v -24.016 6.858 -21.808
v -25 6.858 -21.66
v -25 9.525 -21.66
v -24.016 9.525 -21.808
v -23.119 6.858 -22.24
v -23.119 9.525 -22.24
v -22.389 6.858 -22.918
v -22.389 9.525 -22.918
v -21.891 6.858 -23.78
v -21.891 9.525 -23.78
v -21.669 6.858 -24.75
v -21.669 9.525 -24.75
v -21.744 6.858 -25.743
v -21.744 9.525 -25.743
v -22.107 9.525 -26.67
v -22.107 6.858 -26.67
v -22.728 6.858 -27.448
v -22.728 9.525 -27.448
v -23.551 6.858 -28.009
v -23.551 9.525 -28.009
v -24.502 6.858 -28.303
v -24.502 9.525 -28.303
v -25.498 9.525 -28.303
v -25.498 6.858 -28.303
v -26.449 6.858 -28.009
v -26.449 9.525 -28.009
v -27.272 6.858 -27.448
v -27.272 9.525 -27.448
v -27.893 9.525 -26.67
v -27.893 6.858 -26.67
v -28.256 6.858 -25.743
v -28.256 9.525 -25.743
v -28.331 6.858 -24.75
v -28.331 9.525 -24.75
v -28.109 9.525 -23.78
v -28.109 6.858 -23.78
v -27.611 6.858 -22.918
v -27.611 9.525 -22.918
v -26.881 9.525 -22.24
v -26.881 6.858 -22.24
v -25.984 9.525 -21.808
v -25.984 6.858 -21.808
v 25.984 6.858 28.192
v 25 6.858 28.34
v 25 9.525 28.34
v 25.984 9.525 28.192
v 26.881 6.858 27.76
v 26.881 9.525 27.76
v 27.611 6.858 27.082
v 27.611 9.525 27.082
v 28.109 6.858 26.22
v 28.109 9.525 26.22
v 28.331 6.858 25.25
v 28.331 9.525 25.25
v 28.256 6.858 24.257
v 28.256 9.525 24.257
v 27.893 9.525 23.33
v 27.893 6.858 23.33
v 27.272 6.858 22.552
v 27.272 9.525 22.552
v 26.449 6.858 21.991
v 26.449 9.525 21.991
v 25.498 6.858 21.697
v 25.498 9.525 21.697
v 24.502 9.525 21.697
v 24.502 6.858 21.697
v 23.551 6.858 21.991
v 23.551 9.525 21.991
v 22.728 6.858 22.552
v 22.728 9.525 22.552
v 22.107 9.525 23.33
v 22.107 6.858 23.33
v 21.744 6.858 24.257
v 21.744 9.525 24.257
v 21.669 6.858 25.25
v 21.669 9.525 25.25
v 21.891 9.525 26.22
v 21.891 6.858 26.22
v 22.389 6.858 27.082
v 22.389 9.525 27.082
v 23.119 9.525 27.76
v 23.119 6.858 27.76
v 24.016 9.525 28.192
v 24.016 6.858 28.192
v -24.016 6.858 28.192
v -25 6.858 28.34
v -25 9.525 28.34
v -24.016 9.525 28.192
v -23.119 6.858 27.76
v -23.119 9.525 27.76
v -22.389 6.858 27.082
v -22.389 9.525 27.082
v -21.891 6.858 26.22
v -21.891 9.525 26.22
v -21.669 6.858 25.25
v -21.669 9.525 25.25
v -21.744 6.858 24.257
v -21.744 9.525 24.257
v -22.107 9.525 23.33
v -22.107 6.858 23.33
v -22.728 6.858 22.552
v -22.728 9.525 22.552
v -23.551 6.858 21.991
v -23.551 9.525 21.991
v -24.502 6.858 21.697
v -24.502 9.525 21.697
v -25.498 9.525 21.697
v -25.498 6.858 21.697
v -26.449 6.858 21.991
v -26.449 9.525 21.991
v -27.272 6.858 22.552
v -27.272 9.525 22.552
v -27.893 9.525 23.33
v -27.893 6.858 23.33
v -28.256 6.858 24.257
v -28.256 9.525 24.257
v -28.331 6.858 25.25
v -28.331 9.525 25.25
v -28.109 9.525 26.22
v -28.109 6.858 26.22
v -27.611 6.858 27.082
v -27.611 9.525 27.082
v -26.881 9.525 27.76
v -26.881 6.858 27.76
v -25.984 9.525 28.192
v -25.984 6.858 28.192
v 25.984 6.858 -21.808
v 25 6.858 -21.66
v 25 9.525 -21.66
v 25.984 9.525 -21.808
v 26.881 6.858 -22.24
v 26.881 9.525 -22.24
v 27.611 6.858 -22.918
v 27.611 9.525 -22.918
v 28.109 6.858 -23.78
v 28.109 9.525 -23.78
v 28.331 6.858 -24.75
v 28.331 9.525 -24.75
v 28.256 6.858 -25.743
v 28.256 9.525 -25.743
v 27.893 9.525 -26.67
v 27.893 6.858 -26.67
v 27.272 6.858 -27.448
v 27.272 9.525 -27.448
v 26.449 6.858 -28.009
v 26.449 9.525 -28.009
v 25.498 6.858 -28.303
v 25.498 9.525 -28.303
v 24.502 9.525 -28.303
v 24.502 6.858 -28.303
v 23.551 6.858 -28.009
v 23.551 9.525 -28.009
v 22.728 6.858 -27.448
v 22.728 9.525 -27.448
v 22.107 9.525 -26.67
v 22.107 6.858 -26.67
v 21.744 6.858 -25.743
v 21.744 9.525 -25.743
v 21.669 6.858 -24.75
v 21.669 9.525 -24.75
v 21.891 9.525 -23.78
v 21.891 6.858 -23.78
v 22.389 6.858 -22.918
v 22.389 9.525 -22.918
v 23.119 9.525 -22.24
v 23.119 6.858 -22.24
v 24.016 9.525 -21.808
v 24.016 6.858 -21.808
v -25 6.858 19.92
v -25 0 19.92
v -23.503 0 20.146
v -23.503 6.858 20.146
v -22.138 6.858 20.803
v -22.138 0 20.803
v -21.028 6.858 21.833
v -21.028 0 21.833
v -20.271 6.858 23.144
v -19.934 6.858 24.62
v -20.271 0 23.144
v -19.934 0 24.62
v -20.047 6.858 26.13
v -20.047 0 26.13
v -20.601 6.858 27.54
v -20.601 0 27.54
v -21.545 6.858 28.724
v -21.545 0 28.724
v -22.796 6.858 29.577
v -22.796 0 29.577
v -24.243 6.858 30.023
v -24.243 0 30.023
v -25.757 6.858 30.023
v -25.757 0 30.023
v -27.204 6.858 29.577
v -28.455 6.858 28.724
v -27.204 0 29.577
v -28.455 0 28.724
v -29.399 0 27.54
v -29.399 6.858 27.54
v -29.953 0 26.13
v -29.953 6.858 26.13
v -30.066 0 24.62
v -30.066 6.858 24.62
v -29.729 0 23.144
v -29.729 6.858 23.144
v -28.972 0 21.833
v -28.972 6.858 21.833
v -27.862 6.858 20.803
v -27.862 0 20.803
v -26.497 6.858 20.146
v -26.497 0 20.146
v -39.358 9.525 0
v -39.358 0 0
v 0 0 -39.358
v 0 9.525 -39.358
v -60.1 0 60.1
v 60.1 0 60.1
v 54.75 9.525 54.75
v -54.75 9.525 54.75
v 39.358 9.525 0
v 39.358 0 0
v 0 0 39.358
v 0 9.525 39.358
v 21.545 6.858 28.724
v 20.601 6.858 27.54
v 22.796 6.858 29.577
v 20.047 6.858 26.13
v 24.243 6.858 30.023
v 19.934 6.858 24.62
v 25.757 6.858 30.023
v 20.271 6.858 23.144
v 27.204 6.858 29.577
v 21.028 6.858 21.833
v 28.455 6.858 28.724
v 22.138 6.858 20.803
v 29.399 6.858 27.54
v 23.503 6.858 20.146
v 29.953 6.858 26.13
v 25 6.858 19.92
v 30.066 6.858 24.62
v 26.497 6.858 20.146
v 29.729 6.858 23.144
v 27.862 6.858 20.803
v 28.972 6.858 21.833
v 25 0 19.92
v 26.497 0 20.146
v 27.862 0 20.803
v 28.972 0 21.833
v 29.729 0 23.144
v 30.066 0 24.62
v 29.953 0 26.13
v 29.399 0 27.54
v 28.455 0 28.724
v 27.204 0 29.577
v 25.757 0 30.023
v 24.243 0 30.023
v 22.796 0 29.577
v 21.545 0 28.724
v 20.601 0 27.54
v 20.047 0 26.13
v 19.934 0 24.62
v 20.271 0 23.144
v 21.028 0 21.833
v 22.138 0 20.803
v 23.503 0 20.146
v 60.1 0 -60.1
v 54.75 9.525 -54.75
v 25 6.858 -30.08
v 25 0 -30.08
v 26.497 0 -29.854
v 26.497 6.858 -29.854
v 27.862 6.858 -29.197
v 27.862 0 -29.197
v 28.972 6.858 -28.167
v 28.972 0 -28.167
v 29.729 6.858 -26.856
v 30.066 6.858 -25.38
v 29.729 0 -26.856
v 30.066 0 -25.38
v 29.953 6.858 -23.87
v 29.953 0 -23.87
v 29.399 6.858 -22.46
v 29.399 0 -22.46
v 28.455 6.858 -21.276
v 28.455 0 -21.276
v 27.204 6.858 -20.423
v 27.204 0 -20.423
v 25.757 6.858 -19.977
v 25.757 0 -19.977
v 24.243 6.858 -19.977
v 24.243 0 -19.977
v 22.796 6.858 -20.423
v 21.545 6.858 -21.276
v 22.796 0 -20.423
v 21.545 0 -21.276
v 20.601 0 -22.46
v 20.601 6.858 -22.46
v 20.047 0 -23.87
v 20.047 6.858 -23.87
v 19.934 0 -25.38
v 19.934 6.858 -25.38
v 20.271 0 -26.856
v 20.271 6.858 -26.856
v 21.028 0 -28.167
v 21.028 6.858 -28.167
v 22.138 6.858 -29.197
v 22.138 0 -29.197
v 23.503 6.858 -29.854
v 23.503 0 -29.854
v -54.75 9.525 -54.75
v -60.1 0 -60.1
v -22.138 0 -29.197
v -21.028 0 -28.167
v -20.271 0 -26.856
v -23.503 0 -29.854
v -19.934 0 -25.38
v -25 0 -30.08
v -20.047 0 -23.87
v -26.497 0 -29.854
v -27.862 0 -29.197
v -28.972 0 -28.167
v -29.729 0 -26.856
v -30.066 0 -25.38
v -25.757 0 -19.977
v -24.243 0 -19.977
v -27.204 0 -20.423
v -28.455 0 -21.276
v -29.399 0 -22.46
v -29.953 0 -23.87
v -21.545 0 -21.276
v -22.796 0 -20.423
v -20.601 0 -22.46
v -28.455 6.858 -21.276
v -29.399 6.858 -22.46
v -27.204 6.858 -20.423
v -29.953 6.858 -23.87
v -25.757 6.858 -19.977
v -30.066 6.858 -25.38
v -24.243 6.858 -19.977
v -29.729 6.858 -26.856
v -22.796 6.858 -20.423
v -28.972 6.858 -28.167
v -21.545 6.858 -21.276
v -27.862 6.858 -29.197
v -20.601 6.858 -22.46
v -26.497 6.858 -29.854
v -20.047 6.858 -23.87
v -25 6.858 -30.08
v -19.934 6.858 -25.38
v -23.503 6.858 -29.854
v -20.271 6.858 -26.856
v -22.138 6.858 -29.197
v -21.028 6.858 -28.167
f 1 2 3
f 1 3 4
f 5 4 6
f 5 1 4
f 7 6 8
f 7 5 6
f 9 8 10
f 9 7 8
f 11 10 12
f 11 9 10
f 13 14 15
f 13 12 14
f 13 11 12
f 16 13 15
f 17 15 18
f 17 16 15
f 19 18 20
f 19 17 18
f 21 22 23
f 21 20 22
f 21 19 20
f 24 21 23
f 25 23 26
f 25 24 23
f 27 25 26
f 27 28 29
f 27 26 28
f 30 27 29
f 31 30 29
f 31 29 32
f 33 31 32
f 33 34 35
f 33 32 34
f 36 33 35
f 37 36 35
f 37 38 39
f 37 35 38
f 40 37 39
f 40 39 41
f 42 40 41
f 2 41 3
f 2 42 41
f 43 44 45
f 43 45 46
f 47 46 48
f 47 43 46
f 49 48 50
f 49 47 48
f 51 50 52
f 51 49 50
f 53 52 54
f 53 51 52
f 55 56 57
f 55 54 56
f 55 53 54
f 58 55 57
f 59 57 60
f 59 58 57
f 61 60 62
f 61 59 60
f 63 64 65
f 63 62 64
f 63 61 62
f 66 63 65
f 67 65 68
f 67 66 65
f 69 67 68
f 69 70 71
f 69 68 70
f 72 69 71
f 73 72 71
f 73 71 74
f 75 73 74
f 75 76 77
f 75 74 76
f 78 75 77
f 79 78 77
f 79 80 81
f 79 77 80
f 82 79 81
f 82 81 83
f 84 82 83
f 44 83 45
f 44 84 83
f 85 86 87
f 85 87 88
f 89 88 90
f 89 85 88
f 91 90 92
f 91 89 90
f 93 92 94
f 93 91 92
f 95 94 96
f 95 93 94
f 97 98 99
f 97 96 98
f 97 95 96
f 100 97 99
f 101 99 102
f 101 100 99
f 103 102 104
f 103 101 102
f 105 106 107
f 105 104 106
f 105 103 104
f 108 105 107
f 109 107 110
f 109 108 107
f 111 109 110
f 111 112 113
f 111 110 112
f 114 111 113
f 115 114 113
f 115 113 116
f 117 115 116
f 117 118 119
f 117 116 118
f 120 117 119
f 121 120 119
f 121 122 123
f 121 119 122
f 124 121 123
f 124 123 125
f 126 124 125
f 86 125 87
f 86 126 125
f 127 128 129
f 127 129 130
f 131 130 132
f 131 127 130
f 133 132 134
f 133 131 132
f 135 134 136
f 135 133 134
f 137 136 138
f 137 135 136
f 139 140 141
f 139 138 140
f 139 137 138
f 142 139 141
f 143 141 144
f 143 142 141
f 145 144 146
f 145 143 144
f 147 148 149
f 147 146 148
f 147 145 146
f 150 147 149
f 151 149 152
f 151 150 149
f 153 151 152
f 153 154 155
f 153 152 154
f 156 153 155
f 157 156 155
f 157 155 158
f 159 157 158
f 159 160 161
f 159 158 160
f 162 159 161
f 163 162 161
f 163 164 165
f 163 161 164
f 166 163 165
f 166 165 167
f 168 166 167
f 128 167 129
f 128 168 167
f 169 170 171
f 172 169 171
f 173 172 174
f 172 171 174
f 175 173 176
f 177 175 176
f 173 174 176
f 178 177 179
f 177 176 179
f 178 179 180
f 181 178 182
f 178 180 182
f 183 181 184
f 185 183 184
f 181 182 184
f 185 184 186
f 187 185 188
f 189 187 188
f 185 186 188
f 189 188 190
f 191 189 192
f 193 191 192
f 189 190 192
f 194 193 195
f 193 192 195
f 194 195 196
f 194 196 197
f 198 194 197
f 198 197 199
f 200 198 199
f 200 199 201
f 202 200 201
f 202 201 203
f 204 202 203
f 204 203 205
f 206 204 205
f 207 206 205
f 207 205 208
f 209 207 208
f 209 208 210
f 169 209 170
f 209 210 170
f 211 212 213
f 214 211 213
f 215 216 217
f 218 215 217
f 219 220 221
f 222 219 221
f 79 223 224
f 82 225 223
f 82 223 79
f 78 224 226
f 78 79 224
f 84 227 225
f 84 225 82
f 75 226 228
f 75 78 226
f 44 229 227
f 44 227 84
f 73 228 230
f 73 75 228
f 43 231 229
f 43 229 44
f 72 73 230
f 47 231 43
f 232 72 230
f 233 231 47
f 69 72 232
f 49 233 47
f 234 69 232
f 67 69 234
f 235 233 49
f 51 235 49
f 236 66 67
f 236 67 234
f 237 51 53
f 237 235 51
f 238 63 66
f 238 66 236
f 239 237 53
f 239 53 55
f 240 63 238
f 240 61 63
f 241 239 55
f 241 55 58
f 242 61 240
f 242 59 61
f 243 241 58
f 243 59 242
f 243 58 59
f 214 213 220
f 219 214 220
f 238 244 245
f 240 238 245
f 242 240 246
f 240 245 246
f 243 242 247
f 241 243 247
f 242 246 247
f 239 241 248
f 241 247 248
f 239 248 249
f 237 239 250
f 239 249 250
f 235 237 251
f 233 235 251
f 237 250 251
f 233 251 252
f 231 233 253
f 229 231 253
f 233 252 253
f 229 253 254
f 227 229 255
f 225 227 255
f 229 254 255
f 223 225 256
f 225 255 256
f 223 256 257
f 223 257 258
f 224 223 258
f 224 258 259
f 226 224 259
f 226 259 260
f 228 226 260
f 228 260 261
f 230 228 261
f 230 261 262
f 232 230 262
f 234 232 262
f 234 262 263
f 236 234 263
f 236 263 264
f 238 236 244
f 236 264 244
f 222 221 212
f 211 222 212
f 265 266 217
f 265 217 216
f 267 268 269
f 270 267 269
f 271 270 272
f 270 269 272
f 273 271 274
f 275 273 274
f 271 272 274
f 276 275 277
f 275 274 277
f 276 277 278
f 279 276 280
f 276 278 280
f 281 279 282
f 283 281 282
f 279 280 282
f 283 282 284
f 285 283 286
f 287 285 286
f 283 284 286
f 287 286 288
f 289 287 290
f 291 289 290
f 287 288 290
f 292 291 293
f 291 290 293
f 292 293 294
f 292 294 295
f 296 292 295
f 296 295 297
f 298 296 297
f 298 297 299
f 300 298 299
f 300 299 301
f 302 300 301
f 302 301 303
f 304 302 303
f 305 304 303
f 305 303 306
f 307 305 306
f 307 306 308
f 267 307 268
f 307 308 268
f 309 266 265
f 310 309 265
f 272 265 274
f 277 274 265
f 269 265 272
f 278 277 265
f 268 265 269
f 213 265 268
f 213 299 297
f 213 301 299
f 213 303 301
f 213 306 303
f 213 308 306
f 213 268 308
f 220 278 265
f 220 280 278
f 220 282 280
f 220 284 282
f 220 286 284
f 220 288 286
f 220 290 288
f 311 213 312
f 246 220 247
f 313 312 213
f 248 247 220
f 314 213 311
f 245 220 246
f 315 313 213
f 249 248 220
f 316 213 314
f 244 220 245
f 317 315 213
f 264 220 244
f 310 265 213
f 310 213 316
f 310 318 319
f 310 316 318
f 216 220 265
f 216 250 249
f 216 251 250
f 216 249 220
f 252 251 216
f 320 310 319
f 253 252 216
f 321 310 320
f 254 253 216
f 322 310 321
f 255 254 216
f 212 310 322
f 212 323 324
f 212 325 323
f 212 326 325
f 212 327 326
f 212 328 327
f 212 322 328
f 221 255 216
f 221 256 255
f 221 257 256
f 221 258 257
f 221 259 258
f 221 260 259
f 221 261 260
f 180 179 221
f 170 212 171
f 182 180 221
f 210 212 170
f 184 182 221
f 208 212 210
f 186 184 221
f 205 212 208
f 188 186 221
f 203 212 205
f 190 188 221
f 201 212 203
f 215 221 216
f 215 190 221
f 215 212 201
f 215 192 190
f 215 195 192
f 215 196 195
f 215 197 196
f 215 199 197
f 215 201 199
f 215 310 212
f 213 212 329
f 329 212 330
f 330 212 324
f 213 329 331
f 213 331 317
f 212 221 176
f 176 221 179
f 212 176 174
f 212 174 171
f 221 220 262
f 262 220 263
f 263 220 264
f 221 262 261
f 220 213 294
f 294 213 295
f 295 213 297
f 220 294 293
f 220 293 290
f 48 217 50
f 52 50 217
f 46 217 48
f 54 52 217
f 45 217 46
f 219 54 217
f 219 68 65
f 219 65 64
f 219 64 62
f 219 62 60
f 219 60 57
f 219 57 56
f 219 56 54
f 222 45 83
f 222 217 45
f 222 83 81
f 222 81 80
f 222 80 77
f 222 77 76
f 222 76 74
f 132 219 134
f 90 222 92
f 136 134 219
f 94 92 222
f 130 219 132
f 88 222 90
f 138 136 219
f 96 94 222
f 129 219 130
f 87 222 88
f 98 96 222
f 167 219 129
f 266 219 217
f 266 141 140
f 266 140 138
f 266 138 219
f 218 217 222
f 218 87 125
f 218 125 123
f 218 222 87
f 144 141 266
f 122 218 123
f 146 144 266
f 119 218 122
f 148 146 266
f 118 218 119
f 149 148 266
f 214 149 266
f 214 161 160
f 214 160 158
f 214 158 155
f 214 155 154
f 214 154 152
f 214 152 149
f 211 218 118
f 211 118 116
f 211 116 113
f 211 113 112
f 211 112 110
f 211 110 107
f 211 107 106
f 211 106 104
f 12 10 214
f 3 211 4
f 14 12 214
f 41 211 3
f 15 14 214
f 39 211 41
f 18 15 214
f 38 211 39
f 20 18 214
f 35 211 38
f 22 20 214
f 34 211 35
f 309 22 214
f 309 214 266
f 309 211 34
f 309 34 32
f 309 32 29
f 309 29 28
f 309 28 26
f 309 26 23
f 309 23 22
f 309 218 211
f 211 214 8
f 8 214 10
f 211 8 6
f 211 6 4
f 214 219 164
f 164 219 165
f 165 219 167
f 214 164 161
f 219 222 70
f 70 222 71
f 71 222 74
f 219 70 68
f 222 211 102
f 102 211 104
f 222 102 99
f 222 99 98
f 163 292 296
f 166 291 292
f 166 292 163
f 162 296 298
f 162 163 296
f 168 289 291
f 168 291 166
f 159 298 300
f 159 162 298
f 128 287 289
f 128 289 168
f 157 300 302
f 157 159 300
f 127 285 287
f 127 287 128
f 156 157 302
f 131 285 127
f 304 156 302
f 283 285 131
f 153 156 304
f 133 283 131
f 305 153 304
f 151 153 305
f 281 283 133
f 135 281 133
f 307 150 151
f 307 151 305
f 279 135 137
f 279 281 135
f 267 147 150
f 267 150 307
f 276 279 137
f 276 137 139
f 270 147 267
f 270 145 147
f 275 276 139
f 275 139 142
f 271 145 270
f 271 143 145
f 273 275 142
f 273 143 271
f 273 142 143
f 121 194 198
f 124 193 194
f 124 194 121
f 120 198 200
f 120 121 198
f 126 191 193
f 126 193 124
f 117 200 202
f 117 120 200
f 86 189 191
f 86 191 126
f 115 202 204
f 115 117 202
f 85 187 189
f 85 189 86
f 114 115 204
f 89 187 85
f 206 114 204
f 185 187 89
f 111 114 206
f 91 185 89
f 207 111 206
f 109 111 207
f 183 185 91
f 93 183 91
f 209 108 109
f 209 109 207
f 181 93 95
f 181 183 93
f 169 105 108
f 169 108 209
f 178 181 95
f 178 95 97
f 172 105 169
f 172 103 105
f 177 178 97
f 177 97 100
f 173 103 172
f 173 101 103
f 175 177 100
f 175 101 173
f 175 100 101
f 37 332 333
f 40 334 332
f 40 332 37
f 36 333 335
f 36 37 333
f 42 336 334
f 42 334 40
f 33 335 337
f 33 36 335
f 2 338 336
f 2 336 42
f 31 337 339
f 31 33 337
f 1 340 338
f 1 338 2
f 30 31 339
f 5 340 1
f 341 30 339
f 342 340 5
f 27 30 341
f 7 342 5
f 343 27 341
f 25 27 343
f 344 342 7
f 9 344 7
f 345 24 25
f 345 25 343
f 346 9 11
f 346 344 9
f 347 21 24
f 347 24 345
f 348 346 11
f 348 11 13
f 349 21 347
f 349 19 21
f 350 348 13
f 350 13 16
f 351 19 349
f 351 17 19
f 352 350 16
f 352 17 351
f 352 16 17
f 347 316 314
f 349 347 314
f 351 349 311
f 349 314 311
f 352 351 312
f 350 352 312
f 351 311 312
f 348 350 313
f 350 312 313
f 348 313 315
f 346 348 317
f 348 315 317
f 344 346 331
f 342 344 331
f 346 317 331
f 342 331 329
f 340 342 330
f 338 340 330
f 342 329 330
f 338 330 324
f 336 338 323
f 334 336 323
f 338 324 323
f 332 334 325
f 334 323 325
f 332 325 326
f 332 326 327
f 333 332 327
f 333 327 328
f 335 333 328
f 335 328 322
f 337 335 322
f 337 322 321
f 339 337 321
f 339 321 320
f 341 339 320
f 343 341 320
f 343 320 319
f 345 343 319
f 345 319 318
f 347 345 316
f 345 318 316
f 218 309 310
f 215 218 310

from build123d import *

# Parameters (mm, degrees)
BOSS_EXTRUDE1_DEPTH      = 60.1
BOSS_EXTRUDE1_DEPTH_BACK = 60.1
CUT_EXTRUDE3_DEPTH       = 86.526286164
CUT_EXTRUDE3_DEPTH_BACK  = 86.526286164
SKETCH2_R                = 3.34
CUT_EXTRUDE5_DEPTH       = 86.526286164
SKETCH8_R                = 5.08
CUT_EXTRUDE6_DEPTH       = 6.858


with BuildPart() as part:
    # Sketch5 → Boss-Extrude1 (new, two sides: drawn at the far end of the back side and taken through both)
    with BuildSketch(Plane(origin=(0, 0, 0), x_dir=(0, 0, -1), z_dir=(1, 0, 0)).offset(-BOSS_EXTRUDE1_DEPTH_BACK)):
        Polygon((60.1, 0), (-60.1, 0), (-54.75, 9.525), (54.75, 9.525), align=None)
    extrude(amount=BOSS_EXTRUDE1_DEPTH + BOSS_EXTRUDE1_DEPTH_BACK)

    # Sketch6 → Cut-Extrude3 (cut, two sides: drawn at the far end of the back side and taken through both)
    with BuildSketch(Plane.XY.offset(-CUT_EXTRUDE3_DEPTH_BACK)):
        Polygon((-54.75, 9.525), (-60.1, 0), (-60.1, 9.525), align=None)
        Polygon((60.1, 9.525), (54.75, 9.525), (60.1, 0), align=None)
    extrude(amount=CUT_EXTRUDE3_DEPTH + CUT_EXTRUDE3_DEPTH_BACK, mode=Mode.SUBTRACT)

    # Sketch2 → Cut-Extrude5 (cut, through all)
    with BuildSketch(Plane(origin=(0, 0, 0), x_dir=(1, 0, 0), z_dir=(0, 1, 0))):
        with Locations((-25, 25)):
            Circle(SKETCH2_R)
        with Locations((25, 25)):
            Circle(SKETCH2_R)
        with Locations((25, -25)):
            Circle(SKETCH2_R)
        with Locations((-25, -25)):
            Circle(SKETCH2_R)
        Polygon((-39.357563441, 0), (0, 39.357563441), (39.357563441, 0), (0, -39.357563441), align=None)
    extrude(amount=CUT_EXTRUDE5_DEPTH, mode=Mode.SUBTRACT)

    # Sketch8 → Cut-Extrude6 (cut)
    with BuildSketch(Plane.XZ):
        with Locations((-25, 25)):
            Circle(SKETCH8_R)
        with Locations((25, 25)):
            Circle(SKETCH8_R)
        with Locations((25, -25)):
            Circle(SKETCH8_R)
        with Locations((-25, -25)):
            Circle(SKETCH8_R)
    extrude(amount=-CUT_EXTRUDE6_DEPTH, mode=Mode.SUBTRACT)


solid = part.part
